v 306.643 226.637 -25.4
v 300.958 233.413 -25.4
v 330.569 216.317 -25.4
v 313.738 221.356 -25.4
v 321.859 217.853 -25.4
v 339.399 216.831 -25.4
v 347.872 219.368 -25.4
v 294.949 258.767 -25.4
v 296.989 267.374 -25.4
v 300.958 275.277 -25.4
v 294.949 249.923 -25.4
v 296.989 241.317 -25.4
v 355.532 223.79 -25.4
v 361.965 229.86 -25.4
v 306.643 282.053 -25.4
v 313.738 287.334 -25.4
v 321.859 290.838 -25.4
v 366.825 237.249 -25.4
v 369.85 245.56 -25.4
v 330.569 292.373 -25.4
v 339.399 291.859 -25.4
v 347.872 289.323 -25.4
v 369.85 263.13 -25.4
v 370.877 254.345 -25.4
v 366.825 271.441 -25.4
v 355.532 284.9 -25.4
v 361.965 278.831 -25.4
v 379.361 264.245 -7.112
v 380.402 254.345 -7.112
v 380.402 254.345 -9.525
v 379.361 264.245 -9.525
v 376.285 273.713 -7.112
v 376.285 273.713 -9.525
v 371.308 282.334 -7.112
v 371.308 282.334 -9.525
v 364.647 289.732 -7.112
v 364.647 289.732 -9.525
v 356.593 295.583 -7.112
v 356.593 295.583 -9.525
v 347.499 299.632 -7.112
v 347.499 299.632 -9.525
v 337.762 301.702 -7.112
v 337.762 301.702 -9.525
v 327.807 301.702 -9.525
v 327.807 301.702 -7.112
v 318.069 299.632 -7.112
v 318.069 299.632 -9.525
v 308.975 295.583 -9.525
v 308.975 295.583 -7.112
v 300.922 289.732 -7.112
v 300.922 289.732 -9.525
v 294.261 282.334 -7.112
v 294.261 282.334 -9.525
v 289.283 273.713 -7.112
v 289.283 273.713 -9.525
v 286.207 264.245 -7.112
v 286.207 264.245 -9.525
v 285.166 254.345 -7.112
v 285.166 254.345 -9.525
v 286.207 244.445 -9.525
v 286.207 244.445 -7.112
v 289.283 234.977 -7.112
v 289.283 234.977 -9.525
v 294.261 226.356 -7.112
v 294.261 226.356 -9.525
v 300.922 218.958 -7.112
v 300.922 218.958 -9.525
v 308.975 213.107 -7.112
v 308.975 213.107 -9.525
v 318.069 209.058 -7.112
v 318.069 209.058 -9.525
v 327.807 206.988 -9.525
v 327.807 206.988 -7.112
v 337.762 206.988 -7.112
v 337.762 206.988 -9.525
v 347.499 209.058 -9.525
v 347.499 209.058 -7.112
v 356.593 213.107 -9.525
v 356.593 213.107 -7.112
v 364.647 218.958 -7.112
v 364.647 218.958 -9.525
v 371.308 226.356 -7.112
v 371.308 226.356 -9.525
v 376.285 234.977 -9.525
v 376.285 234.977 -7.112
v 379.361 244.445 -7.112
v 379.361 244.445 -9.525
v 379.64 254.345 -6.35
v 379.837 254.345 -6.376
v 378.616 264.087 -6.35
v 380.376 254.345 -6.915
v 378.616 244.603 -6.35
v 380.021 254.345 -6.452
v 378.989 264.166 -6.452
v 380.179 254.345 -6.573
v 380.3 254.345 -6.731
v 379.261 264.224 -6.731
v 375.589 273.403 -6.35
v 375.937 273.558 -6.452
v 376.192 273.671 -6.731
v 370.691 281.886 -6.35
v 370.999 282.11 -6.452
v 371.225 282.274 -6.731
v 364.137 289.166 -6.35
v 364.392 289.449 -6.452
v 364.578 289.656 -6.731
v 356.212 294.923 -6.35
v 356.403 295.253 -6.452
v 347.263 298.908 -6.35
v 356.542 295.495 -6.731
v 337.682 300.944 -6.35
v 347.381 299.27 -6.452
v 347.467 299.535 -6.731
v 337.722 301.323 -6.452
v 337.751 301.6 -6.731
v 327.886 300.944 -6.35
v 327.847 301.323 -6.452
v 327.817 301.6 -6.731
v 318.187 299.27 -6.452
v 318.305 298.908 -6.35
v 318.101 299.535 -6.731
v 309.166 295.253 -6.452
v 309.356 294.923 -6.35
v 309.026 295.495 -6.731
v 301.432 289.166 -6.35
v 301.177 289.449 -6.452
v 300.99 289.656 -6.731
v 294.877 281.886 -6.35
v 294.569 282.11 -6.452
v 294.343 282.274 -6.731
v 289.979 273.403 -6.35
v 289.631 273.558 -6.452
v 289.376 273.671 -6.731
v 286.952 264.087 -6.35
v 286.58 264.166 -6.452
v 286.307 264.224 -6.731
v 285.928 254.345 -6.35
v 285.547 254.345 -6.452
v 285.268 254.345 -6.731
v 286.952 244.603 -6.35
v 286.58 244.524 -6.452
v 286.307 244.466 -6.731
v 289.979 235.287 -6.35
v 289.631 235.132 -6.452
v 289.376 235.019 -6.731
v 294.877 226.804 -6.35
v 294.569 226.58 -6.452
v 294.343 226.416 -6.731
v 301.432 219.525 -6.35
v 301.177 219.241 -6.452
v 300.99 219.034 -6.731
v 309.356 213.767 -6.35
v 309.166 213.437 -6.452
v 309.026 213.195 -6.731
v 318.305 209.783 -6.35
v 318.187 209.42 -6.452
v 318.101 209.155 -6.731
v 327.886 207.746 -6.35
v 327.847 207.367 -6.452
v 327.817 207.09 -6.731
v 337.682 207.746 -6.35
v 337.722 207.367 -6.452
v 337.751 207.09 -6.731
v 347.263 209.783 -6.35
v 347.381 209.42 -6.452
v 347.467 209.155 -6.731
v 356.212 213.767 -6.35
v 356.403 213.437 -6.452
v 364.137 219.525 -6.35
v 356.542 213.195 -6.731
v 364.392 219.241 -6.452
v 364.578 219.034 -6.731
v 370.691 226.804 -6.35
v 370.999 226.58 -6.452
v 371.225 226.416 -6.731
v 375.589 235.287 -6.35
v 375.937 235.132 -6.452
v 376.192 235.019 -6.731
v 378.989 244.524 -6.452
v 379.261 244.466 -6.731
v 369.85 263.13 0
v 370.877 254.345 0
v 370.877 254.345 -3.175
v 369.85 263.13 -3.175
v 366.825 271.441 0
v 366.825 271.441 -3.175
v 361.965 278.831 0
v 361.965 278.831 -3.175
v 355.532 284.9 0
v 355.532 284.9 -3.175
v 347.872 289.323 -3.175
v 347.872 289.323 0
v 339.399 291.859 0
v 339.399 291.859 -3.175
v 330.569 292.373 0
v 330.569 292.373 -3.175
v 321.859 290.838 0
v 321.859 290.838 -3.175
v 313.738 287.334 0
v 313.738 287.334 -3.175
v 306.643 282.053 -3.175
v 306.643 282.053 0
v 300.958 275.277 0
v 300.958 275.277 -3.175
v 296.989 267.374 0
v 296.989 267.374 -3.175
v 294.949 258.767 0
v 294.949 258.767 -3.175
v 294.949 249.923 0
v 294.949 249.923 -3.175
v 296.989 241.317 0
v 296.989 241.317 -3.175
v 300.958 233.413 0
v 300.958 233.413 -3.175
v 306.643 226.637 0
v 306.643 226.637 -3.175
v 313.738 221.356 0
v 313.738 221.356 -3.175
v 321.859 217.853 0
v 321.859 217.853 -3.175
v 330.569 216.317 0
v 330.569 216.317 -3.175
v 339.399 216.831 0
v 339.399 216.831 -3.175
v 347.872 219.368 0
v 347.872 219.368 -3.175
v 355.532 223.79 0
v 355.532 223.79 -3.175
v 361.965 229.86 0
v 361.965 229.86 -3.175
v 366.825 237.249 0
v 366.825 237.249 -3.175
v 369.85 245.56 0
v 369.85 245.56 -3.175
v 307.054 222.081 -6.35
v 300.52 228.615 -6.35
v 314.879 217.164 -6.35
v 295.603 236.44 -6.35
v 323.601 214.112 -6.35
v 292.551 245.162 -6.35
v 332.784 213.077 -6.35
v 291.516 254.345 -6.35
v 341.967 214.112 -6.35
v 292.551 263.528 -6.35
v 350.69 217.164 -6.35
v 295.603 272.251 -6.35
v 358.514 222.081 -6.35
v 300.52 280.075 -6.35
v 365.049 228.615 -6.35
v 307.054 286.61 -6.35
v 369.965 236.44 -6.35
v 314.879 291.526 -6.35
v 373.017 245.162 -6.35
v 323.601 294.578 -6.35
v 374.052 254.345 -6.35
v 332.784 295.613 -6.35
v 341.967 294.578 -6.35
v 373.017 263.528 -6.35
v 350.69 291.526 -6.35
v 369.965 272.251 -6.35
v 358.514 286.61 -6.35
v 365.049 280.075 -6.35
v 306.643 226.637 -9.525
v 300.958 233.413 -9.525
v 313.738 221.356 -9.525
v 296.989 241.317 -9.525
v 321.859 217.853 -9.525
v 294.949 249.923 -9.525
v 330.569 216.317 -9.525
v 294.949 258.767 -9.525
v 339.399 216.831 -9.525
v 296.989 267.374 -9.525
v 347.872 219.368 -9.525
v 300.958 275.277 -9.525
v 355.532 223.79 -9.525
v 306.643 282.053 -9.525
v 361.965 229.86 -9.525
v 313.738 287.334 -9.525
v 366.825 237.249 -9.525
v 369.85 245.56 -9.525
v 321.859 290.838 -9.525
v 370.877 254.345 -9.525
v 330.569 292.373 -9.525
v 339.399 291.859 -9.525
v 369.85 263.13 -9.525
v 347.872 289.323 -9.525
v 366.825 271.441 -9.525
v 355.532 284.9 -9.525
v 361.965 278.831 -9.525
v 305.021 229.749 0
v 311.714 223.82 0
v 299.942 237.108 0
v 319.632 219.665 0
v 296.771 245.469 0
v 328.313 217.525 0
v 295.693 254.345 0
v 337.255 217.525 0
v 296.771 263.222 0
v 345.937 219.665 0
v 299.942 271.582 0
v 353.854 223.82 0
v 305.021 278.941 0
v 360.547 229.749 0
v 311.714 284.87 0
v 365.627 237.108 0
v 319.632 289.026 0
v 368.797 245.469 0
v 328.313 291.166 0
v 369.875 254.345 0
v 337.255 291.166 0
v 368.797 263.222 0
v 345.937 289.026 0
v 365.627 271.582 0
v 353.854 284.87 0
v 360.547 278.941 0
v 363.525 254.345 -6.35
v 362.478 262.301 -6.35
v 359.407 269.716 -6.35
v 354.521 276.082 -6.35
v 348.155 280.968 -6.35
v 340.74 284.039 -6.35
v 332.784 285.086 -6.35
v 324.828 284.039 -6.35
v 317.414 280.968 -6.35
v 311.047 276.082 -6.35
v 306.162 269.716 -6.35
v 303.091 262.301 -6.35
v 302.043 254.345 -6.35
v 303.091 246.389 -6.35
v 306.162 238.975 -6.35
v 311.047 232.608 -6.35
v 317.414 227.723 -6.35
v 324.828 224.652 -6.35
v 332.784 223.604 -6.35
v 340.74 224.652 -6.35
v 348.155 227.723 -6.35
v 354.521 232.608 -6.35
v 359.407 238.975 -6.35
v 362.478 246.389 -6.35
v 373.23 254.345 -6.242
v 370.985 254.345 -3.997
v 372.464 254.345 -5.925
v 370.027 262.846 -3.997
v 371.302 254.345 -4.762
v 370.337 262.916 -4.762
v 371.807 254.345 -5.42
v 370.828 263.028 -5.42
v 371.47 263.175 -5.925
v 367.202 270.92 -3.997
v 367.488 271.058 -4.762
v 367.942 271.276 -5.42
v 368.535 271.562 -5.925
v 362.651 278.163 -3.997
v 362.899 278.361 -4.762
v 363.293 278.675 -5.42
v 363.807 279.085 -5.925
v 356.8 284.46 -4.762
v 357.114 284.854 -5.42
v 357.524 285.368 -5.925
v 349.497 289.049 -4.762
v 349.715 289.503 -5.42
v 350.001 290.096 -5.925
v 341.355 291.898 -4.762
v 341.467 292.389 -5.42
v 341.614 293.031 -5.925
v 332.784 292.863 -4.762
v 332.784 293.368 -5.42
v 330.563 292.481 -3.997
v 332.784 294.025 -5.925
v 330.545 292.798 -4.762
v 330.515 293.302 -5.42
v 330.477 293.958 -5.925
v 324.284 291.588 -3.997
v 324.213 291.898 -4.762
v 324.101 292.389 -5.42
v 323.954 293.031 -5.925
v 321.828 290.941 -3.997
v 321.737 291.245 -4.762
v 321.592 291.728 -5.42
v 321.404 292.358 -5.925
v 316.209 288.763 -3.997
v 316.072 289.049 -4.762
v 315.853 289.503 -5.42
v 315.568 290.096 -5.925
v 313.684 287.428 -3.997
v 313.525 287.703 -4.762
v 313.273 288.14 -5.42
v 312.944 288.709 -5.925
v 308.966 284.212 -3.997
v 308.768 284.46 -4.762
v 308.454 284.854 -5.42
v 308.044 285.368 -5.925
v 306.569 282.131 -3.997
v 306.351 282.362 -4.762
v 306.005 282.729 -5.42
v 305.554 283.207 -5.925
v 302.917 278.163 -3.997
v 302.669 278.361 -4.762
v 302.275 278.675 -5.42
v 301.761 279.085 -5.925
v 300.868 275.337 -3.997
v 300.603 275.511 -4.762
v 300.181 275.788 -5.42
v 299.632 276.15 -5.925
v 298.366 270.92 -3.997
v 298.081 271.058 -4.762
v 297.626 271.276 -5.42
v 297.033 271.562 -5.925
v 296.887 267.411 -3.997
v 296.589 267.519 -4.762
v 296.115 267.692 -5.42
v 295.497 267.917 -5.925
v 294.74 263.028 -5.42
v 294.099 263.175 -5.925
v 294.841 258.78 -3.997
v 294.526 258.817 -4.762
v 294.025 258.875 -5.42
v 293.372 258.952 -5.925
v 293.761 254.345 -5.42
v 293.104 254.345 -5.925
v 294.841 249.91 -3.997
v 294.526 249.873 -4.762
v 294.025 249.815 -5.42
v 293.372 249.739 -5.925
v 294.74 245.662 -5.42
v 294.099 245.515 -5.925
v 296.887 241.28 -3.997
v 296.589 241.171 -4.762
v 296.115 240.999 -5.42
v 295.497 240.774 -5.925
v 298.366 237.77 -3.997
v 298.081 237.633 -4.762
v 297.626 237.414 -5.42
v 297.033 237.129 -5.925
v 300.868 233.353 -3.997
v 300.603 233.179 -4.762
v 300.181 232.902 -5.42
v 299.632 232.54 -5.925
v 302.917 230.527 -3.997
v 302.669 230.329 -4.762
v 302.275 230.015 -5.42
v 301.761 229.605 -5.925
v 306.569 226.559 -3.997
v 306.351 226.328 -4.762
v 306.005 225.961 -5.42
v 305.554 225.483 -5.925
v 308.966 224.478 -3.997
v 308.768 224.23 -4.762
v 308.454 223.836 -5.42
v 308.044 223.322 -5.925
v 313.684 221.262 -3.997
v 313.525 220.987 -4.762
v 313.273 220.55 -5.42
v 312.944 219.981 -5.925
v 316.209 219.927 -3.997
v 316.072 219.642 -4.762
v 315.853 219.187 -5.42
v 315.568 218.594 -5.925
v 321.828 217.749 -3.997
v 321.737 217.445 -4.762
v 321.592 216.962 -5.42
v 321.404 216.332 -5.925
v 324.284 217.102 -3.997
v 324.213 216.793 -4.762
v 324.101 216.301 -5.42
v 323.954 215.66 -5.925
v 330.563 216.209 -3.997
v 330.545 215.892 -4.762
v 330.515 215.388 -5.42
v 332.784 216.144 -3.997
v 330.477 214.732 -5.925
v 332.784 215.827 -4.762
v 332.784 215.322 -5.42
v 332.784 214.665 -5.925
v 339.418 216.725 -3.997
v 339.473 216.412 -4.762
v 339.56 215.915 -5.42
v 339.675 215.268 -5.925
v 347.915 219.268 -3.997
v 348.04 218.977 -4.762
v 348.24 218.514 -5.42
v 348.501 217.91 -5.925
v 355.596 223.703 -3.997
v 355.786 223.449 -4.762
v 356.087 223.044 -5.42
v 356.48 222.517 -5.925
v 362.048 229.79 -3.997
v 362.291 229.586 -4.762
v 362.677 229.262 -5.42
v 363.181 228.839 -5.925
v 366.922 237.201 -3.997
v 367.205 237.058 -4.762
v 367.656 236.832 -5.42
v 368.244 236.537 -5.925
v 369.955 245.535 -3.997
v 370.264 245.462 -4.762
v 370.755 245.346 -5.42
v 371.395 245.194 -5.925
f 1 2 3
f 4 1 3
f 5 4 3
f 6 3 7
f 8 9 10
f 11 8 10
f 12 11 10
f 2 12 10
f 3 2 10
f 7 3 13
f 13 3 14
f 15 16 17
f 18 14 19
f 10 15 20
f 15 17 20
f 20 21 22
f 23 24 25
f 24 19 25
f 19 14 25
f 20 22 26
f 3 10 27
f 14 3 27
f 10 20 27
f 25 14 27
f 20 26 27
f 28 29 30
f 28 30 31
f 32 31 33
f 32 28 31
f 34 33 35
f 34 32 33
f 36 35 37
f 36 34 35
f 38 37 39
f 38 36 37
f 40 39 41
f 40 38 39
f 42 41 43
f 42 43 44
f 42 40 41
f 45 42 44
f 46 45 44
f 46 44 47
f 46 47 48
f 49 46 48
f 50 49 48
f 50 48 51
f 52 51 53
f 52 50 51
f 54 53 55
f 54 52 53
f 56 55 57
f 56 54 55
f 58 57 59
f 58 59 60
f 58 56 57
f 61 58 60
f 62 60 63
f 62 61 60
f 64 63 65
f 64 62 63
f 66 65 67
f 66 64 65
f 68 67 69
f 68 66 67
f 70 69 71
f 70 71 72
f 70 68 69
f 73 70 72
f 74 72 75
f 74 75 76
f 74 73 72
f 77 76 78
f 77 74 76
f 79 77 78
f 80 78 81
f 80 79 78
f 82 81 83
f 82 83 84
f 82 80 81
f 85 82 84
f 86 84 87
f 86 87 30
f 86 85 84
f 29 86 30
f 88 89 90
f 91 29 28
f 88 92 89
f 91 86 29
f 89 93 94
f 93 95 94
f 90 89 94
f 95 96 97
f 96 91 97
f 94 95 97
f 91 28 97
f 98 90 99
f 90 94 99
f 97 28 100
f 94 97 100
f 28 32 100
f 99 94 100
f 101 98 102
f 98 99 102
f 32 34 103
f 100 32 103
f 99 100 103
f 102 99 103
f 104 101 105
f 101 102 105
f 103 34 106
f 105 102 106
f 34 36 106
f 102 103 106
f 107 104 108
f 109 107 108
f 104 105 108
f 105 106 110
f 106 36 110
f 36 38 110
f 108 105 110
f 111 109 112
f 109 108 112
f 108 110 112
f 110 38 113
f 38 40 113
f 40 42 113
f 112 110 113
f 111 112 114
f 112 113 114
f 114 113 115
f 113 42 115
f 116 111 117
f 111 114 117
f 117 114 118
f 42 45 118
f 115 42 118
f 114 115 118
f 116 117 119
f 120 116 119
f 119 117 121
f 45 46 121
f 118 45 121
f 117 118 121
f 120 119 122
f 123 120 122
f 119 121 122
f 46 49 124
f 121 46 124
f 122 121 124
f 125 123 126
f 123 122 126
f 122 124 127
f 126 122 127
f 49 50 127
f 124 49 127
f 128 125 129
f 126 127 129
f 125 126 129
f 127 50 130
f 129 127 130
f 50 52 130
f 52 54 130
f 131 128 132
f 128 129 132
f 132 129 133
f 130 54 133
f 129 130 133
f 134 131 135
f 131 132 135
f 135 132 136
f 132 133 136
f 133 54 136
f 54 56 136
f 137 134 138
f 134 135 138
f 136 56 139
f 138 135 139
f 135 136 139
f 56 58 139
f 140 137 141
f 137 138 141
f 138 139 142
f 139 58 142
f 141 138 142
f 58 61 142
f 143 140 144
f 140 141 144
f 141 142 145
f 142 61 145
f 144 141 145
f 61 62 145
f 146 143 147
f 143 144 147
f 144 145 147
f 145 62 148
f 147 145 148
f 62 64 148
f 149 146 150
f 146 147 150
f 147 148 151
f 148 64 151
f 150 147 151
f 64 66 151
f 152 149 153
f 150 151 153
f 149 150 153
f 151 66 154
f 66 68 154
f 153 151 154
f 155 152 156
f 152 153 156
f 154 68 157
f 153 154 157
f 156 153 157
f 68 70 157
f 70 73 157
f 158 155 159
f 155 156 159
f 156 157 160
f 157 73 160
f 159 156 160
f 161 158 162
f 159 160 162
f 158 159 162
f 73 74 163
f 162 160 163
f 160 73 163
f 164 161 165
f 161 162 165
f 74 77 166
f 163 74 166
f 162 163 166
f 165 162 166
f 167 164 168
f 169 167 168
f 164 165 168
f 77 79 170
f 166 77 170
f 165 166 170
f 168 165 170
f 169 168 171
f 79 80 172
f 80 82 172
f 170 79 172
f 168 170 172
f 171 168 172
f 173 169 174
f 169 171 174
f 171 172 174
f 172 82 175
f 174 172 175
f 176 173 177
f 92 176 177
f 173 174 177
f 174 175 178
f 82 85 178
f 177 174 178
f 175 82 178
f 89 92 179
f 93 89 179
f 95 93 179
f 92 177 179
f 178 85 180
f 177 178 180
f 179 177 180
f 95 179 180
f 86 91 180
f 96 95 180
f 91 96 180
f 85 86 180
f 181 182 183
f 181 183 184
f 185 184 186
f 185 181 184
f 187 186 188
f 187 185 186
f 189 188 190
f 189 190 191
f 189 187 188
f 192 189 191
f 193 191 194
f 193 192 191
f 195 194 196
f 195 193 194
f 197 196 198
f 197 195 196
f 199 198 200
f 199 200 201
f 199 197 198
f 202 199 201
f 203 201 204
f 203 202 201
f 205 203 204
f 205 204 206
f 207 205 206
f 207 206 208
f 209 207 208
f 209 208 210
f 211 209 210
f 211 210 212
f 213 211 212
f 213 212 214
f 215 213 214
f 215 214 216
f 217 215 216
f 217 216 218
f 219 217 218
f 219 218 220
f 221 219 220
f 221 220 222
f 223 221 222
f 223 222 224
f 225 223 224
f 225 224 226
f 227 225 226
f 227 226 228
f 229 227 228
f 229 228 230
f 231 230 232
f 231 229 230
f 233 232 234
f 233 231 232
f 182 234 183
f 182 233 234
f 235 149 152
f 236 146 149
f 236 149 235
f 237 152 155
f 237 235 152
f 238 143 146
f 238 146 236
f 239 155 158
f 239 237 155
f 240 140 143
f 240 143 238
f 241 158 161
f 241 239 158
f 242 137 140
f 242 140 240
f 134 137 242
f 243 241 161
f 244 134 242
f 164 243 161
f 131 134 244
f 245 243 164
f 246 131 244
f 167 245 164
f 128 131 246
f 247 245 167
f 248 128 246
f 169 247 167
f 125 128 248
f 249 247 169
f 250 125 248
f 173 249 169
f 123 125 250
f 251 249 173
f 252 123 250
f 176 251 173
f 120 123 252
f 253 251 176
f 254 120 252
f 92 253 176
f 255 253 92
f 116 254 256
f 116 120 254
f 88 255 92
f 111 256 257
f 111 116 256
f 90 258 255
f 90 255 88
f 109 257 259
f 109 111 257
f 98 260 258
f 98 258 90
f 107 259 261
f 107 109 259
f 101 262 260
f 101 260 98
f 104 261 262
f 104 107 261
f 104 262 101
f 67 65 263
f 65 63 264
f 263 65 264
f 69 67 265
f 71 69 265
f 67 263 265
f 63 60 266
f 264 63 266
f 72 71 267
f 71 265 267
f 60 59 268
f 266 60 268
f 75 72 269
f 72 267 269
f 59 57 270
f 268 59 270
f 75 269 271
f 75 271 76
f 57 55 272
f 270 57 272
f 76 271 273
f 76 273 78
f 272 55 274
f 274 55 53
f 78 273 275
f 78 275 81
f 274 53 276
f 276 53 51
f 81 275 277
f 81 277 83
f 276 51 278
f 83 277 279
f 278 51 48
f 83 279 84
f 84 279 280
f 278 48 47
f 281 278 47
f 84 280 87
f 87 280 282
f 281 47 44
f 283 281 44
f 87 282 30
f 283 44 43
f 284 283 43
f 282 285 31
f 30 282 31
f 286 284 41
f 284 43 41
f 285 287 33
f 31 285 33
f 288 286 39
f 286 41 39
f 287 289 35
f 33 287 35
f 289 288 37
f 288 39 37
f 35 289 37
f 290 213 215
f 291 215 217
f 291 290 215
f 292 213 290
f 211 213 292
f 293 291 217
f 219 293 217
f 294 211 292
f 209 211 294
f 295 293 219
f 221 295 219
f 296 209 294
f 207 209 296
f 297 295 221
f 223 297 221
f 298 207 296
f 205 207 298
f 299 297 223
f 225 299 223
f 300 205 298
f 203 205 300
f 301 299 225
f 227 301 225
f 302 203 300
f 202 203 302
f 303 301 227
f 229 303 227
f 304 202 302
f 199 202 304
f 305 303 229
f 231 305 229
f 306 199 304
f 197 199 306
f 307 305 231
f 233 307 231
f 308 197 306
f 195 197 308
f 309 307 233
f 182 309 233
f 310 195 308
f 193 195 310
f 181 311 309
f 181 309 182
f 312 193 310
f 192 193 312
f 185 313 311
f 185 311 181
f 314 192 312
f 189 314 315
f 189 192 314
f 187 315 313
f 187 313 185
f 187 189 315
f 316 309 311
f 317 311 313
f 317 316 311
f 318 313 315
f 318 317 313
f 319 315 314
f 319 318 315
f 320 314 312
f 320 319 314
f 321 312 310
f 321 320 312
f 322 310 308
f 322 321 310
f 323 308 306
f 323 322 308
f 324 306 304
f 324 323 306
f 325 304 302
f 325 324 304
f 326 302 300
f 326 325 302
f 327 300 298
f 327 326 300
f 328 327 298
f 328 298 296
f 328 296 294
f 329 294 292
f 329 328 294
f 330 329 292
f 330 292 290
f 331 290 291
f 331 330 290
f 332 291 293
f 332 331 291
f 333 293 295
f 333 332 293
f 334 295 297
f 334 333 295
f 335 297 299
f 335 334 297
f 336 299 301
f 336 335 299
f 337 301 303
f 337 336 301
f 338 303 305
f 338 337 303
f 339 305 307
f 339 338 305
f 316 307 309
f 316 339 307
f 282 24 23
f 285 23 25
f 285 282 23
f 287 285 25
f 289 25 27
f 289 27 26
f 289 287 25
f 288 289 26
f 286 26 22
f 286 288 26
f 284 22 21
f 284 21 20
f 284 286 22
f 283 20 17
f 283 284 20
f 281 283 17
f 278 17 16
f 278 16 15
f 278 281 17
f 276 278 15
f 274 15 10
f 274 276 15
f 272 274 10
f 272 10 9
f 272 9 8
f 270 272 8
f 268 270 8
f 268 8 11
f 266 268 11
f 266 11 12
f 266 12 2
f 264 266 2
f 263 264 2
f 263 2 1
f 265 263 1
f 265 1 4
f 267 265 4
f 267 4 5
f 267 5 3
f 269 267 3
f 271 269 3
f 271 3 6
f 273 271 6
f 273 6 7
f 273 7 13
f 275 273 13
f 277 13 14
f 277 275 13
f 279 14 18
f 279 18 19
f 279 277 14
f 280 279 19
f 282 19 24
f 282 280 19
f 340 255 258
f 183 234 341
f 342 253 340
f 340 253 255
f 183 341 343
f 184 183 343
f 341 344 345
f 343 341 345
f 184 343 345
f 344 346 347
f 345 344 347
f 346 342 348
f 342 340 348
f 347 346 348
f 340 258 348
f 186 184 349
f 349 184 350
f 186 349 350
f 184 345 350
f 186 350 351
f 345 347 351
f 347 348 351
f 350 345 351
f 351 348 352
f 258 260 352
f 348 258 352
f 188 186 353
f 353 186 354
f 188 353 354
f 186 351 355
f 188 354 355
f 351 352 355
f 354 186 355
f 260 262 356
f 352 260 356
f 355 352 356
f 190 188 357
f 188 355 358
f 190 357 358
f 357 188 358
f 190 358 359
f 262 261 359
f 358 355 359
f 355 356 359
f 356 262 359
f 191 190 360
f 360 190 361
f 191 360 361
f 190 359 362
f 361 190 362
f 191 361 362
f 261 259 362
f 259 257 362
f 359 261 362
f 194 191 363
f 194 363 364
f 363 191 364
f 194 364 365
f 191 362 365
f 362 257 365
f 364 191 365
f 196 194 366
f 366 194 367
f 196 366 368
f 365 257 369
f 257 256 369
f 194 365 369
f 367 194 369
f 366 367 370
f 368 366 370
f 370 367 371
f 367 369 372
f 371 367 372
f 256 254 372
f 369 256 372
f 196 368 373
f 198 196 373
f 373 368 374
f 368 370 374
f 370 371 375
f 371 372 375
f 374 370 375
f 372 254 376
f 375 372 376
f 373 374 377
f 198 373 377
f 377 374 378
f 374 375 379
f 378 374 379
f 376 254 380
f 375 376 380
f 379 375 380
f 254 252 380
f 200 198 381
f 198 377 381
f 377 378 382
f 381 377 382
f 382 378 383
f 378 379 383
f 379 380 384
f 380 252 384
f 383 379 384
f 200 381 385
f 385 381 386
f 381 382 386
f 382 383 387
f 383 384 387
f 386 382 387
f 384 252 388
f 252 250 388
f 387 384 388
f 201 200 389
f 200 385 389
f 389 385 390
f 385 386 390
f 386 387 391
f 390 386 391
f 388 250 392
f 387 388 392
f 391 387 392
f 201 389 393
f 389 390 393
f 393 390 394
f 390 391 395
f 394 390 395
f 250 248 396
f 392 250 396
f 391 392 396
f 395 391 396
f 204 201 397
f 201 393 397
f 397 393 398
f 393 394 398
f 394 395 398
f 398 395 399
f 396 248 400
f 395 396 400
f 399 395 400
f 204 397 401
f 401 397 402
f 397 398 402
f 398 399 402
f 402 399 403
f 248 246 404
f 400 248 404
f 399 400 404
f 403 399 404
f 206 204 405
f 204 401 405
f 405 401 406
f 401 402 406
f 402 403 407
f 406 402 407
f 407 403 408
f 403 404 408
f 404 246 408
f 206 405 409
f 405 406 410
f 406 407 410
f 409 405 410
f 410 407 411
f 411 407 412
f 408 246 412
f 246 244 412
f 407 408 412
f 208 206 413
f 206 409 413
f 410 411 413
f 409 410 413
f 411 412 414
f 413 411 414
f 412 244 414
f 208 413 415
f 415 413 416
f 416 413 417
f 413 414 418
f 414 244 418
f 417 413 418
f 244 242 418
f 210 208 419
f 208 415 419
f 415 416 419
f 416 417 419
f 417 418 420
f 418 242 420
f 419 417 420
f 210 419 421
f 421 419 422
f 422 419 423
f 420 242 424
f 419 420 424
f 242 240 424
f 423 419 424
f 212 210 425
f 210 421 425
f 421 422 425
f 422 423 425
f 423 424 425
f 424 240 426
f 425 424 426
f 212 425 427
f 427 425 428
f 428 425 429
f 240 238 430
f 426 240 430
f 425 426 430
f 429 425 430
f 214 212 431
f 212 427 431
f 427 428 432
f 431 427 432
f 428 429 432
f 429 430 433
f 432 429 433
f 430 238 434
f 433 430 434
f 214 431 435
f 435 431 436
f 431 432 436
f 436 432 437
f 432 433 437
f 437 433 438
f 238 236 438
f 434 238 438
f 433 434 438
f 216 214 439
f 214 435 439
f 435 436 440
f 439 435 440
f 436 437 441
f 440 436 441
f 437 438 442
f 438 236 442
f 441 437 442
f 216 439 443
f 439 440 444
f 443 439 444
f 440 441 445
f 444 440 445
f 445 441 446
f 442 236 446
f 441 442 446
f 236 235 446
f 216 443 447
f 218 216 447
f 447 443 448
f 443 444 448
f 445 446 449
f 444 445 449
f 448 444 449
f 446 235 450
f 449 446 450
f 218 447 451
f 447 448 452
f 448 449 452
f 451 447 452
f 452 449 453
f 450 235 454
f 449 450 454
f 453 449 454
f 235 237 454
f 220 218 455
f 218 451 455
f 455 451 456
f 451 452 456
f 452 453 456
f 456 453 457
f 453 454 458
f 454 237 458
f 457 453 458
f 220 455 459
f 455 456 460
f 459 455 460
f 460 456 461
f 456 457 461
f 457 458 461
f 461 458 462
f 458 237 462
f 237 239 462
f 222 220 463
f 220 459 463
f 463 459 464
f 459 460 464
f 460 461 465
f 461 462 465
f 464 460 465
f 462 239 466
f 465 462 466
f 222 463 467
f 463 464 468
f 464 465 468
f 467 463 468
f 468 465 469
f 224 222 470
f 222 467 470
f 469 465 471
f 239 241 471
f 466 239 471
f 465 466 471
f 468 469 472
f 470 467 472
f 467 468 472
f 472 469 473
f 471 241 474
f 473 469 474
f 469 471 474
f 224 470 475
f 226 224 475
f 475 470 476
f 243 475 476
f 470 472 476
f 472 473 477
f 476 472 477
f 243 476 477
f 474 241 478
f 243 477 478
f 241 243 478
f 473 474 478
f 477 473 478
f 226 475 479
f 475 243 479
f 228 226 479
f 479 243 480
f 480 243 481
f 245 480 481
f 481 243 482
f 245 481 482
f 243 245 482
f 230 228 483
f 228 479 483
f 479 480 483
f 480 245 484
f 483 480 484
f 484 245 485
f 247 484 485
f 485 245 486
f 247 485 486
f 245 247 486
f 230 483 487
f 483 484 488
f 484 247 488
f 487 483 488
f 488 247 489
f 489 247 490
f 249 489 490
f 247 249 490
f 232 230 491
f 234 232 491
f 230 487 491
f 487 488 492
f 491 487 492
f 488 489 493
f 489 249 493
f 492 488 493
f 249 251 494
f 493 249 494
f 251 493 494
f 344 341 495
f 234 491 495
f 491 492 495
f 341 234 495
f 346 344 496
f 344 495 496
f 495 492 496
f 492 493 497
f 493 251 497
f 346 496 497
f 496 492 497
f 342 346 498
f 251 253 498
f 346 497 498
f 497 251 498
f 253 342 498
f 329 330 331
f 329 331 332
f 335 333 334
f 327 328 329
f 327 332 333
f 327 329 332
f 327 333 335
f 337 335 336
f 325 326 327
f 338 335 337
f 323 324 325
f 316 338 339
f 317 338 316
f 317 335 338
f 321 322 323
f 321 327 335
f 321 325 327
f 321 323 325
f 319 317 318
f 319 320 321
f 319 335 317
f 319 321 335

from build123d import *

# Parameters (mm, degrees)
SKETCH2_R      = 38.092749534
EXTRUDE1_DEPTH = 25.4
SKETCH3_R      = 37.09091208
EXTRUDE2_DEPTH = 6.35
CHAMFER1_SIZE  = 6.35
EXTRUDE7_START = -6.35
SKETCH10_R     = 47.61774957
SKETCH10_R_2   = 38.092749534
EXTRUDE7_DEPTH = 3.175
FILLET1_R      = 3.175
FILLET2_R      = 0.762


with BuildPart() as part:
    # Sketch2 → Extrude1 (new body)
    with BuildSketch(Plane.XY):
        with Locations((332.784130452, 254.345130463)):
            Circle(SKETCH2_R)
    extrude(amount=-EXTRUDE1_DEPTH)

    # Sketch3 → Extrude2 (cut)
    with BuildSketch(Plane.XY):
        with Locations((332.784130452, 254.345130463)):
            Circle(SKETCH3_R)
    extrude(amount=-EXTRUDE2_DEPTH, mode=Mode.SUBTRACT)

    # Chamfer1
    chamfer1_edges = [part.edges().sort_by_distance(p)[0] for p in [
        (295.693218372, 254.345130463, -6.35),
    ]]
    chamfer(chamfer1_edges, length=CHAMFER1_SIZE - 0.0001)  # a hair under: the kernel refuses the full size

    # Sketch10 → Extrude7 (add)
    with BuildSketch(Plane.XY.offset(EXTRUDE7_START)):
        with Locations((332.784130452, 254.345130463)):
            Circle(SKETCH10_R)
        with Locations((332.784130452, 254.345130463)):
            Circle(SKETCH10_R_2, mode=Mode.SUBTRACT)
    extrude(amount=-EXTRUDE7_DEPTH)

    # Fillet1
    fillet1_edges = [part.edges().sort_by_distance(p)[0] for p in [
        (294.691380918, 254.345130463, -6.35),
    ]]
    fillet(fillet1_edges, radius=FILLET1_R)

    # Fillet2
    fillet2_edges = [part.edges().sort_by_distance(p)[0] for p in [
        (285.166380882, 254.345130463, -6.35),
    ]]
    fillet(fillet2_edges, radius=FILLET2_R)


solid = part.part
